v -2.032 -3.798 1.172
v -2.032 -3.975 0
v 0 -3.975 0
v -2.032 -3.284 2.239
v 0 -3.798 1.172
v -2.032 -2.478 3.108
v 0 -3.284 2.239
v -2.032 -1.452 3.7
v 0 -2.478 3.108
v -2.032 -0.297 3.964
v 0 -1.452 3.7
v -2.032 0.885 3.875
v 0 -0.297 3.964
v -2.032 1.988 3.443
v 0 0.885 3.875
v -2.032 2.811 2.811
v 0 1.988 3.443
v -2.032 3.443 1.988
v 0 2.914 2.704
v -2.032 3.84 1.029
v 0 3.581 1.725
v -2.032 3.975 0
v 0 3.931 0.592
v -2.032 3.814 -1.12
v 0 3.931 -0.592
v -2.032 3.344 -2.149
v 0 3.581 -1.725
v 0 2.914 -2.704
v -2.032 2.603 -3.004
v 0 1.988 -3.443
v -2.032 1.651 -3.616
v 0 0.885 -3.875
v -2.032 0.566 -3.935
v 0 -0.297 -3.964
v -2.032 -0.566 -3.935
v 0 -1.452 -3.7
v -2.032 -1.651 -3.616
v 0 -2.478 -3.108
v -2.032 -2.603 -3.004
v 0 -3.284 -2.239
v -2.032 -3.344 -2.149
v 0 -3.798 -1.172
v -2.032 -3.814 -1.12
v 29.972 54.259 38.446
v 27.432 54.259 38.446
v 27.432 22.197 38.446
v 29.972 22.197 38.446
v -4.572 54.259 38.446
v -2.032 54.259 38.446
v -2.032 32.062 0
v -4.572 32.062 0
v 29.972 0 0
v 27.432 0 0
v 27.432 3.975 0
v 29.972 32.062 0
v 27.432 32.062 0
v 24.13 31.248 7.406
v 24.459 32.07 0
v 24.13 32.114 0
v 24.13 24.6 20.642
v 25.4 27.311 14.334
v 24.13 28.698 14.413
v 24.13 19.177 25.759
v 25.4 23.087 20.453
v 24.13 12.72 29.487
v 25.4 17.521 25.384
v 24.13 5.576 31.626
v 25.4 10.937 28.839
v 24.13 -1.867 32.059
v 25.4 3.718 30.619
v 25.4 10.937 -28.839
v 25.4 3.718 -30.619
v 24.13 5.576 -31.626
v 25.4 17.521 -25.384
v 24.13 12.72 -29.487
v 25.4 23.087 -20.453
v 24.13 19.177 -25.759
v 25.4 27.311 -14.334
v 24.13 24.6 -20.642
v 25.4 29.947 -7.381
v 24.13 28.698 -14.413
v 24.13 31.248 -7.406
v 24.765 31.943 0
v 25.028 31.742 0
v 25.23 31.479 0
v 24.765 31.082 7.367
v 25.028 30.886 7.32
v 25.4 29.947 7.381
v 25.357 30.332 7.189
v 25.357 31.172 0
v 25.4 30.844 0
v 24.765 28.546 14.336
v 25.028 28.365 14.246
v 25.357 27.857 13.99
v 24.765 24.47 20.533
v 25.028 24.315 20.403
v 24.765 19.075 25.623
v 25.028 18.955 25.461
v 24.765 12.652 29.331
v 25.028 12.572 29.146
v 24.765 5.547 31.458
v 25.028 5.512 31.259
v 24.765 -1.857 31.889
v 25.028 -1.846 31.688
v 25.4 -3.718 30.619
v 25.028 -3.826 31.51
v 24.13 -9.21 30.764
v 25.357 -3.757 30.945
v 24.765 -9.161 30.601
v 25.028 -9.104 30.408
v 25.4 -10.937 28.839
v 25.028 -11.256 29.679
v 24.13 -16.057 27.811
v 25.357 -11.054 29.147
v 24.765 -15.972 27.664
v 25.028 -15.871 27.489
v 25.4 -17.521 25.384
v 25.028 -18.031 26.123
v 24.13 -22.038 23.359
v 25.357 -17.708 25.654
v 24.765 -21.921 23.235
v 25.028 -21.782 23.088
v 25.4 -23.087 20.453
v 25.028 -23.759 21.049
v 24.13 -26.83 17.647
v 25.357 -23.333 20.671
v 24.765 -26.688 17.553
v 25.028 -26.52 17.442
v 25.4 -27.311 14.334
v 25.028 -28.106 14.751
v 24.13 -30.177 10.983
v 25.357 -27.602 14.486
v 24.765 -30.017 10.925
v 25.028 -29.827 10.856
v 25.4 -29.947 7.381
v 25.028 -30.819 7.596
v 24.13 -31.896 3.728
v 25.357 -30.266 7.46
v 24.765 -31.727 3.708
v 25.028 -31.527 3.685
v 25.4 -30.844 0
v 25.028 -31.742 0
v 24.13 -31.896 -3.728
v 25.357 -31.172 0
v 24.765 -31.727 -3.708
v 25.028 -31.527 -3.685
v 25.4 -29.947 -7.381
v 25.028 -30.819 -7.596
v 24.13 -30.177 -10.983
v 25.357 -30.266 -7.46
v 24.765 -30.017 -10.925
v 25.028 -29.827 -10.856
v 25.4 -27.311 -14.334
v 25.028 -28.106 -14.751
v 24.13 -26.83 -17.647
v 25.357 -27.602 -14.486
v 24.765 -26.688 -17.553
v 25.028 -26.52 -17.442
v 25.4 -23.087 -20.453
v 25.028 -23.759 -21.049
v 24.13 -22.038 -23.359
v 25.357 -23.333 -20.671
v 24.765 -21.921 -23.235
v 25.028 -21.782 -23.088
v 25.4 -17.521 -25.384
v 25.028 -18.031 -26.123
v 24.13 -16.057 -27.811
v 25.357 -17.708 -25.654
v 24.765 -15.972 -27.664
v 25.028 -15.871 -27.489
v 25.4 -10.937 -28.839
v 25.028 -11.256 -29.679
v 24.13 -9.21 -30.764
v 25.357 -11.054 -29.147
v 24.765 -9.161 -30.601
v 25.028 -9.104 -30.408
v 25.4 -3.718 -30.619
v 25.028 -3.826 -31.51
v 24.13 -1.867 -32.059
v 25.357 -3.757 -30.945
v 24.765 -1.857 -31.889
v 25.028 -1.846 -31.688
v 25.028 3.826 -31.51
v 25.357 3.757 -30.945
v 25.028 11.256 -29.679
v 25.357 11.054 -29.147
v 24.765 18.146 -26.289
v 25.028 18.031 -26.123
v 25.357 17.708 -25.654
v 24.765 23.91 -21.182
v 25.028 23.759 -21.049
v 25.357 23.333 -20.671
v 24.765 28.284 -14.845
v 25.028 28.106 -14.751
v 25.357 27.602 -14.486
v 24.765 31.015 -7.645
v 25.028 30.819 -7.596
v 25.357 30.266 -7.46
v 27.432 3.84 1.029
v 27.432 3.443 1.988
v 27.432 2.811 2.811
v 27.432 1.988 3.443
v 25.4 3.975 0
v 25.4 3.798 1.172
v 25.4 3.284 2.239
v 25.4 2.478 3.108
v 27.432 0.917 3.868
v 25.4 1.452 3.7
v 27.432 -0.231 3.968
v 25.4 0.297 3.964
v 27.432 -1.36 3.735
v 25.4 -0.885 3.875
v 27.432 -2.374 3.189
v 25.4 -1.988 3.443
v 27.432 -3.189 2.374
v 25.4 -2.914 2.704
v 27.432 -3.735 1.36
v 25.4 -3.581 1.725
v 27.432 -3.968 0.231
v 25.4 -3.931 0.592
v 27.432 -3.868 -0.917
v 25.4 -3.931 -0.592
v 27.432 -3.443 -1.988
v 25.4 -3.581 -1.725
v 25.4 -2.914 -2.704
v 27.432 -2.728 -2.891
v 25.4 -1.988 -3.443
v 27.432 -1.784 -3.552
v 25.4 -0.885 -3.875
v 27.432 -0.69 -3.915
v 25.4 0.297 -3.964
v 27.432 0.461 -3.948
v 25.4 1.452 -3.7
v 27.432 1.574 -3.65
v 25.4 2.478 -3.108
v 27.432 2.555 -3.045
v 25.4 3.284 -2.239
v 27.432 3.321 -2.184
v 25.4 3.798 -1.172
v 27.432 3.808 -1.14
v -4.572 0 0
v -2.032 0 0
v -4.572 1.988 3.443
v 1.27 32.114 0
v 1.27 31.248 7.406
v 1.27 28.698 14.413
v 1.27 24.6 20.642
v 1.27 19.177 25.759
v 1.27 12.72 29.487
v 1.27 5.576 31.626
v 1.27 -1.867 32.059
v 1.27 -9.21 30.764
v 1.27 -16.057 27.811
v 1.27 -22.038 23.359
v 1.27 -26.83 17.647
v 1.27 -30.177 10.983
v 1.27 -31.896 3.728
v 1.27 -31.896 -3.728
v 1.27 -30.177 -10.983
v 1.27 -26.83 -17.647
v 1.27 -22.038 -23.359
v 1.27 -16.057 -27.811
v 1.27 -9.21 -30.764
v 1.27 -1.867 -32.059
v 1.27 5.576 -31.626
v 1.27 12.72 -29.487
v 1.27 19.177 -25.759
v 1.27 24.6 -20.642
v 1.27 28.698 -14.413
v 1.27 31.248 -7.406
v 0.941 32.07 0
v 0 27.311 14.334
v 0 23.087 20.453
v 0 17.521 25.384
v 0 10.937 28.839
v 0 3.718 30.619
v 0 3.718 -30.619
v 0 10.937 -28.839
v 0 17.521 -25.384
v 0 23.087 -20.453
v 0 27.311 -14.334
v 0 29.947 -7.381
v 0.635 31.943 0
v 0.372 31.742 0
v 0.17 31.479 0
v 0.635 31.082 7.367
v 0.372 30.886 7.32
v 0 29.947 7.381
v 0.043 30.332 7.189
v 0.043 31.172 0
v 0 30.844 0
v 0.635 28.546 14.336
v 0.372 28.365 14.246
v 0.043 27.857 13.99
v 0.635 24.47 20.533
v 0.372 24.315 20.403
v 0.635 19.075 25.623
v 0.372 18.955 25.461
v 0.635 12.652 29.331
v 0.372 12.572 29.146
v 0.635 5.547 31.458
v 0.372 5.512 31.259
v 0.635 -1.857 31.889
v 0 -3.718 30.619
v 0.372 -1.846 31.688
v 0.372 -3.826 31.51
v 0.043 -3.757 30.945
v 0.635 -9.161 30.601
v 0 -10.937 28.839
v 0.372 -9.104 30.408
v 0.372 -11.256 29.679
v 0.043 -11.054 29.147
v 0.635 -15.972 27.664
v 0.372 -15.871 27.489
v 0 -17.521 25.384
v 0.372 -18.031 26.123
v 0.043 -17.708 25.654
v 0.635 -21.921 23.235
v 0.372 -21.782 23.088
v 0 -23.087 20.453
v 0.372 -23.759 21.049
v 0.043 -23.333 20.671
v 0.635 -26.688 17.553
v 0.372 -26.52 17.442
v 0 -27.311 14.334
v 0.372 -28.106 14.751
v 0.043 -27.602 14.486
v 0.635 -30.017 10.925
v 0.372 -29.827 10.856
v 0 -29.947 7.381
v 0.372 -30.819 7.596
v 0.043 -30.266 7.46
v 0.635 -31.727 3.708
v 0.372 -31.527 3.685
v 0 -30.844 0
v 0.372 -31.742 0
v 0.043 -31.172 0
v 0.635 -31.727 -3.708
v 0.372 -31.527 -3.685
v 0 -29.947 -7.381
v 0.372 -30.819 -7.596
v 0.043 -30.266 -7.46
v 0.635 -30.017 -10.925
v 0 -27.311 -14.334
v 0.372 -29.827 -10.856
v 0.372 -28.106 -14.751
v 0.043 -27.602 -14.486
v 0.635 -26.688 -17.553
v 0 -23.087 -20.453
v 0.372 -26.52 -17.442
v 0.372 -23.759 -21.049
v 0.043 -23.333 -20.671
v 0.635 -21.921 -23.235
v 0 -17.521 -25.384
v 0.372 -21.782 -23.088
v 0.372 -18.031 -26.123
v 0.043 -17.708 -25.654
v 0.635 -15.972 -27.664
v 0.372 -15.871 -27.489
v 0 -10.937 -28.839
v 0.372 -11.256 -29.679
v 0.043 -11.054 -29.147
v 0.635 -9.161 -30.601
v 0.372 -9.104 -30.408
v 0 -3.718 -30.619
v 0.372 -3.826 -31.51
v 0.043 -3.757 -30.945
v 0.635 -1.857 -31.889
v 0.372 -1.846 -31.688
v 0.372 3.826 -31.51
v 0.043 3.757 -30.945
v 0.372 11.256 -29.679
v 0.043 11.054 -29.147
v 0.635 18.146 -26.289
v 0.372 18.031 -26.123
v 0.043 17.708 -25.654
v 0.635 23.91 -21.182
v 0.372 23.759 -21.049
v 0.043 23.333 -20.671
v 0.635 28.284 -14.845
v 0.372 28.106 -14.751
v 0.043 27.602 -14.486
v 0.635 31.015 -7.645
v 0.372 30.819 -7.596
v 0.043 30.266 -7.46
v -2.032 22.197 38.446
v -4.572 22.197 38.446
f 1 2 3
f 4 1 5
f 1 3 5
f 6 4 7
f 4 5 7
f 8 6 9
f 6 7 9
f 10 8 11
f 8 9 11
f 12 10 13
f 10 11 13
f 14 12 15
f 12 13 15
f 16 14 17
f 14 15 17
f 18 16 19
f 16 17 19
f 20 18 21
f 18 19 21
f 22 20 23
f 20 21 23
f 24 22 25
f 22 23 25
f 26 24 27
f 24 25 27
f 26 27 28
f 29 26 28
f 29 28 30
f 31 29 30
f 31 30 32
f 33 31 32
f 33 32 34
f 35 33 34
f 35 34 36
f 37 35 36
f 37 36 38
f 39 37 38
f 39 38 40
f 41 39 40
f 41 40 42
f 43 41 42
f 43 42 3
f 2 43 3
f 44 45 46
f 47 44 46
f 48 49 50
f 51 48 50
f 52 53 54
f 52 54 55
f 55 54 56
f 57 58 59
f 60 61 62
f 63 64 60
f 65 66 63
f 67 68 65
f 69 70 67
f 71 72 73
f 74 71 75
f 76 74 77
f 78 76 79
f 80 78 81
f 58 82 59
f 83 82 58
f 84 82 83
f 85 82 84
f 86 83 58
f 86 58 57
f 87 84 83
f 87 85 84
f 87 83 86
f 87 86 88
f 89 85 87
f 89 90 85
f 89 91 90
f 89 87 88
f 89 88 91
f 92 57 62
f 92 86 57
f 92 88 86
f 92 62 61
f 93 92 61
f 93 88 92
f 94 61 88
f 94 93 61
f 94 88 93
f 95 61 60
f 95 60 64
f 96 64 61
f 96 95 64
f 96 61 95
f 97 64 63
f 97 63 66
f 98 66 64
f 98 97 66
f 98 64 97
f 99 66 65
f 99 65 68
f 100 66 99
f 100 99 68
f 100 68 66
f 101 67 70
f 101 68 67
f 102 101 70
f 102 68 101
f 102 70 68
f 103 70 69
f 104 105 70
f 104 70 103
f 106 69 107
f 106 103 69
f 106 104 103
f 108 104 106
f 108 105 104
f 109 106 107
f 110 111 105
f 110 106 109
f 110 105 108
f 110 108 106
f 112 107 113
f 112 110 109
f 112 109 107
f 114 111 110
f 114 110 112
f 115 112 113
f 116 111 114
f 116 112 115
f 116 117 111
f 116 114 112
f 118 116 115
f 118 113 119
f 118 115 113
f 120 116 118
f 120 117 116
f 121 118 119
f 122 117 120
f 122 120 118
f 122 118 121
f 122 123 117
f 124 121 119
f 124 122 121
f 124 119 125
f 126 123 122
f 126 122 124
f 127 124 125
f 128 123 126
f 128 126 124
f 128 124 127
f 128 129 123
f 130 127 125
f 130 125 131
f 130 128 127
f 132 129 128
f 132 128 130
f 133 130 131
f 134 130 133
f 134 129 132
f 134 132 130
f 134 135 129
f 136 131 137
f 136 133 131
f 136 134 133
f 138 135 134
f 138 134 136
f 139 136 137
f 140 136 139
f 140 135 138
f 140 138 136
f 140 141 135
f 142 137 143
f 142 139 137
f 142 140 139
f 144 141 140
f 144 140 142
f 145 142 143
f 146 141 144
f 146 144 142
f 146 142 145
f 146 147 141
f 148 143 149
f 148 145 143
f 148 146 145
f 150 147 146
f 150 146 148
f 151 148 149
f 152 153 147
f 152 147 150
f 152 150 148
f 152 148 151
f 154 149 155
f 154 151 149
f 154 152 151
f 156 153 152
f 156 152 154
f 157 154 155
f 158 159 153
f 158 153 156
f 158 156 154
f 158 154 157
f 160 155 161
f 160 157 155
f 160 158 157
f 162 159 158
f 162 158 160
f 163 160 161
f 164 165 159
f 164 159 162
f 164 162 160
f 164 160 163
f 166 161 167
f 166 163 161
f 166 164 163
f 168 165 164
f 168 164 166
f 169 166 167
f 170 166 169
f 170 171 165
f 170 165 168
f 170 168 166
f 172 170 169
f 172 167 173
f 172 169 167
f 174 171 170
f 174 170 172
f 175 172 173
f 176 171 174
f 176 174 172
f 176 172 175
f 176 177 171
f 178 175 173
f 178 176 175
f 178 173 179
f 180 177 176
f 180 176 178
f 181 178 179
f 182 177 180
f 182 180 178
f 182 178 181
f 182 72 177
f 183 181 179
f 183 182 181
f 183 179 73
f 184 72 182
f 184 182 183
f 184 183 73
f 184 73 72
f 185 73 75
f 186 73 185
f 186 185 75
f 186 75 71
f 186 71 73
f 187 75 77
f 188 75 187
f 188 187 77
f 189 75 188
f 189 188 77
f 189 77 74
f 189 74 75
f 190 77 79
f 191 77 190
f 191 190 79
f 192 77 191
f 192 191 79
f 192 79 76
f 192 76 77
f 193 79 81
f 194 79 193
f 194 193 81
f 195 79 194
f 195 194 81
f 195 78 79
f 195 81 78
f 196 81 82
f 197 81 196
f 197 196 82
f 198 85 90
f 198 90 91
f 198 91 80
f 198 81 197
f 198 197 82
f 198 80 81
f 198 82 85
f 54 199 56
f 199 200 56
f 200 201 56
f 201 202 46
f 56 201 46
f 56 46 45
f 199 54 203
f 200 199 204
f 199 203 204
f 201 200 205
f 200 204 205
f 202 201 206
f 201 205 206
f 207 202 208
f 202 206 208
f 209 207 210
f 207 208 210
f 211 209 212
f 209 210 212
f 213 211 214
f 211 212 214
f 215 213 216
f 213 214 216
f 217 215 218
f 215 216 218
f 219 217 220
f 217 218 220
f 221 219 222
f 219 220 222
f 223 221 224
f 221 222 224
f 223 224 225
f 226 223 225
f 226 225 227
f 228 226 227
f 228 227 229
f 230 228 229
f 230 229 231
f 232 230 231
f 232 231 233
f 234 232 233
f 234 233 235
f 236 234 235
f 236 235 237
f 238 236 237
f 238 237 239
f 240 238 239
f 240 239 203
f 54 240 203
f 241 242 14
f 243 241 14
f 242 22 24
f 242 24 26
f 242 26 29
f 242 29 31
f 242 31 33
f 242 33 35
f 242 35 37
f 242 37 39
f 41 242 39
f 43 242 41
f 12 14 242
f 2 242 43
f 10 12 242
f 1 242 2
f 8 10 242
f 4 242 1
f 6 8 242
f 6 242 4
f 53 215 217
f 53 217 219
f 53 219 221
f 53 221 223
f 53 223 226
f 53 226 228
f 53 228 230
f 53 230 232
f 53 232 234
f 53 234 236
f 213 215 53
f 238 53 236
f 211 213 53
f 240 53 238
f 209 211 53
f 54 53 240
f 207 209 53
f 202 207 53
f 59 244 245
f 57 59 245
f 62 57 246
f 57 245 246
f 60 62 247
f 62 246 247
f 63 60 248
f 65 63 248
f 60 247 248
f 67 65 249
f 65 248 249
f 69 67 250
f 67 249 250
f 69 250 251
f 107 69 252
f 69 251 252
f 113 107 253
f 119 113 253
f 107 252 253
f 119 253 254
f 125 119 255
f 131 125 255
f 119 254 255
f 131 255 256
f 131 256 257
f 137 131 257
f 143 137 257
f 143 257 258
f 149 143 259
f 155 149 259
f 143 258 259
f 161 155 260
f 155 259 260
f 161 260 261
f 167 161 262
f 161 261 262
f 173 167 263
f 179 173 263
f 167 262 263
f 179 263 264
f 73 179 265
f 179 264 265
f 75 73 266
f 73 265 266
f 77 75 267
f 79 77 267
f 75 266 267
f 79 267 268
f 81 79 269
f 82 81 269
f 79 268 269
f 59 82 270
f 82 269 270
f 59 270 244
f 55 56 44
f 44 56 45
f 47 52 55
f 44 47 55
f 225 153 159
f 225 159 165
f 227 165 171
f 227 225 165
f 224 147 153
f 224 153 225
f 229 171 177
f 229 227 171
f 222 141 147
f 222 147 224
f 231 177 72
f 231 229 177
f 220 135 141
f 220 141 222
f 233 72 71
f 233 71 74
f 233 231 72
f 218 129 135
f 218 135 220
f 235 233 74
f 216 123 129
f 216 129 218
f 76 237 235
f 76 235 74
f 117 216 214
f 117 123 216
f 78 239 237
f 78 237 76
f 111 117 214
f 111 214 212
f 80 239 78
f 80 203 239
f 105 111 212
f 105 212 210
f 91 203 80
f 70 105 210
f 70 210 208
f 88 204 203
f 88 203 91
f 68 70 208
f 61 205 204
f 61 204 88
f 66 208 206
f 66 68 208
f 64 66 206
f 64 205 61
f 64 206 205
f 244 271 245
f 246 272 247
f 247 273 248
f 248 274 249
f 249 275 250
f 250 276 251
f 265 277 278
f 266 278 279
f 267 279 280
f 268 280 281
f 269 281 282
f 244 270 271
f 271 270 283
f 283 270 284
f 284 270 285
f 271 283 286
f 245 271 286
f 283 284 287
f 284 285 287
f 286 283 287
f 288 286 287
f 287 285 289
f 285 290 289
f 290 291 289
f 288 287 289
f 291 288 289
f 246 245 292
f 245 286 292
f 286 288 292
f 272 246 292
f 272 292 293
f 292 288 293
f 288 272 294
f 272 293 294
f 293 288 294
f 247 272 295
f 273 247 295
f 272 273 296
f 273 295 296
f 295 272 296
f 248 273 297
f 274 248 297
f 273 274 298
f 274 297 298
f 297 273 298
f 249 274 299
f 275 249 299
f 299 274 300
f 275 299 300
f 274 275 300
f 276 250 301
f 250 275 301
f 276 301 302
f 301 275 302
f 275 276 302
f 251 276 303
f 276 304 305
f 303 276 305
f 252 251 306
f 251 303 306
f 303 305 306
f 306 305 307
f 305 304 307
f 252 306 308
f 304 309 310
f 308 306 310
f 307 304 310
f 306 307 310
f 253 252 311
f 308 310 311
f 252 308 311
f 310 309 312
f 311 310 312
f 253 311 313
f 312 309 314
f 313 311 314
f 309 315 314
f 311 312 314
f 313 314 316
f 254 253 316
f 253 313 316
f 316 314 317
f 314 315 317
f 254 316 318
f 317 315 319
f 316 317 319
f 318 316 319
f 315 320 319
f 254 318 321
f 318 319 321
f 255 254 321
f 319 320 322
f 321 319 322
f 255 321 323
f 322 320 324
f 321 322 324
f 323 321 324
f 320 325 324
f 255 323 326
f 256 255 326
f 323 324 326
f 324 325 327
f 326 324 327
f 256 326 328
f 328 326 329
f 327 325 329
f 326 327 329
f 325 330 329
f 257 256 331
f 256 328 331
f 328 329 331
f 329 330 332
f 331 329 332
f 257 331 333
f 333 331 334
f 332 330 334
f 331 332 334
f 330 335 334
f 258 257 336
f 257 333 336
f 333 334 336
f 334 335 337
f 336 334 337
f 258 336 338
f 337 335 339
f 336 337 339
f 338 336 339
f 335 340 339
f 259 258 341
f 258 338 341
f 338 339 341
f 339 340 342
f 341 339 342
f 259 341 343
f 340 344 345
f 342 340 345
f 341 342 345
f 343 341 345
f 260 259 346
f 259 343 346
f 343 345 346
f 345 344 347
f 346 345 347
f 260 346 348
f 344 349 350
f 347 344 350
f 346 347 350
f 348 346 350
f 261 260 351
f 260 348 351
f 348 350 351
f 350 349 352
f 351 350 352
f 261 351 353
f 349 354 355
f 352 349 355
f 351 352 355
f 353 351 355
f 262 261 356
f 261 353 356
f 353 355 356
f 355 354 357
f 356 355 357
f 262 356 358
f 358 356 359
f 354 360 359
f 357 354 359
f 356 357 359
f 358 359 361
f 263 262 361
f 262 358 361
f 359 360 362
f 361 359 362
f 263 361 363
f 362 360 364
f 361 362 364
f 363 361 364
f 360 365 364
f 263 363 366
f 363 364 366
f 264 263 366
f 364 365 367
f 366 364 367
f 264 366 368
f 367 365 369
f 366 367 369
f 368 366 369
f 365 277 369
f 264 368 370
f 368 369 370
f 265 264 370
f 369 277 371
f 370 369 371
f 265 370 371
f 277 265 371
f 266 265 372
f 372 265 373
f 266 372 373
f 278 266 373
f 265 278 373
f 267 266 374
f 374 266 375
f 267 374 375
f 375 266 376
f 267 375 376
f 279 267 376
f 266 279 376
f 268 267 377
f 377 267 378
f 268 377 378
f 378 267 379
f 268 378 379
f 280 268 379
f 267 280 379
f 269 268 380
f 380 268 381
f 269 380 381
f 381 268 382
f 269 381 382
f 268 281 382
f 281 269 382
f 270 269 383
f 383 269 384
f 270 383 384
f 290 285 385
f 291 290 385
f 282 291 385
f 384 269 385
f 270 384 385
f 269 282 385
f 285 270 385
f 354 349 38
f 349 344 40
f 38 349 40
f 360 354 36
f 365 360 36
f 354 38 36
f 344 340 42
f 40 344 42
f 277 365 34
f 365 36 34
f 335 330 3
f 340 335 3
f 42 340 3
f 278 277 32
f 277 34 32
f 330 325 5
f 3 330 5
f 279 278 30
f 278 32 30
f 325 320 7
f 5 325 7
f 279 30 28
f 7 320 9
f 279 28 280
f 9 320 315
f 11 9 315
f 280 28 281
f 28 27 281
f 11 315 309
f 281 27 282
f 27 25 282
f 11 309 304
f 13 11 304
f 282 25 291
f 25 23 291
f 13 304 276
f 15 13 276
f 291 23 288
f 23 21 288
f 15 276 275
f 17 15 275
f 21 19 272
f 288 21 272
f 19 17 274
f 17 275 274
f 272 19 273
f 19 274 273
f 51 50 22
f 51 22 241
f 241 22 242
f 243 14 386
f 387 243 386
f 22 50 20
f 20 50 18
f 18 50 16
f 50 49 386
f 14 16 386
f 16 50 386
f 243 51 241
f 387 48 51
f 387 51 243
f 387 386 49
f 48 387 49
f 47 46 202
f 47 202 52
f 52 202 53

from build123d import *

# Parameters (mm, degrees)
F0_R      = 32.113527
F1_DEPTH  = 25.4
F2_R      = 1.27
F3_R      = 1.27
F4_R      = 3.9751
F5_DEPTH  = 2.032
F7_R      = 3.9751
F8_DEPTH  = 2.032
F10_DEPTH = 2.54
F12_DEPTH = 2.54


with BuildPart() as f1:
    # F0 (on Right) → F1 (new body)
    with BuildSketch(Plane.YZ):
        Circle(F0_R)
    extrude(amount=F1_DEPTH)

    # F2
    f2_edges = [f1.edges().sort_by_distance(p)[0] for p in [
        (25.4, -32.113527, 0),
    ]]
    fillet(f2_edges, radius=F2_R)

    # F3
    f3_edges = [f1.edges().sort_by_distance(p)[0] for p in [
        (0, -32.113527, 0),
    ]]
    fillet(f3_edges, radius=F3_R)

    # F4 (on face) → F5 (join)
    with BuildSketch(Plane.YZ.offset(25.4)):
        Circle(F4_R)
    extrude(amount=F5_DEPTH)

    # F7 (on face) → F8 (join)
    with BuildSketch(Plane(origin=(0, 0, 0), x_dir=(0, -1, 0), z_dir=(-1, 0, 0))):
        Circle(F7_R)
    extrude(amount=F8_DEPTH)

    # F9 (on face) → F10 (join)
    with BuildSketch(Plane(origin=(-2.032, 0, 0), x_dir=(0, -1, 0), z_dir=(-1, 0, 0))):
        with BuildLine():
            ThreePointArc((-3.9751, 0), (-3.442538, 1.98755), (-1.98755, 3.442538))
            Line((-1.98755, 3.442538), (-22.197079, 38.446468))
            Line((-22.197079, 38.446468), (-54.258845, 38.446468))
            Line((-54.258845, 38.446468), (-32.061767, 0))
            Line((-32.061767, 0), (-3.9751, 0))
        make_face()
        with BuildLine():
            Line((-3.9751, 0), (0, 0))
            Line((0, 0), (-1.98755, 3.442538))
            ThreePointArc((-1.98755, 3.442538), (-3.442538, 1.98755), (-3.9751, 0))
        make_face()
    extrude(amount=F10_DEPTH)

    # F11 (on face) → F12 (join)
    with BuildSketch(Plane.YZ.offset(27.432)):
        Polygon((32.061767, 0), (54.258845, 38.446468), (22.197079, 38.446468), (0, 0), align=None)
    extrude(amount=F12_DEPTH)


solid = f1.part
